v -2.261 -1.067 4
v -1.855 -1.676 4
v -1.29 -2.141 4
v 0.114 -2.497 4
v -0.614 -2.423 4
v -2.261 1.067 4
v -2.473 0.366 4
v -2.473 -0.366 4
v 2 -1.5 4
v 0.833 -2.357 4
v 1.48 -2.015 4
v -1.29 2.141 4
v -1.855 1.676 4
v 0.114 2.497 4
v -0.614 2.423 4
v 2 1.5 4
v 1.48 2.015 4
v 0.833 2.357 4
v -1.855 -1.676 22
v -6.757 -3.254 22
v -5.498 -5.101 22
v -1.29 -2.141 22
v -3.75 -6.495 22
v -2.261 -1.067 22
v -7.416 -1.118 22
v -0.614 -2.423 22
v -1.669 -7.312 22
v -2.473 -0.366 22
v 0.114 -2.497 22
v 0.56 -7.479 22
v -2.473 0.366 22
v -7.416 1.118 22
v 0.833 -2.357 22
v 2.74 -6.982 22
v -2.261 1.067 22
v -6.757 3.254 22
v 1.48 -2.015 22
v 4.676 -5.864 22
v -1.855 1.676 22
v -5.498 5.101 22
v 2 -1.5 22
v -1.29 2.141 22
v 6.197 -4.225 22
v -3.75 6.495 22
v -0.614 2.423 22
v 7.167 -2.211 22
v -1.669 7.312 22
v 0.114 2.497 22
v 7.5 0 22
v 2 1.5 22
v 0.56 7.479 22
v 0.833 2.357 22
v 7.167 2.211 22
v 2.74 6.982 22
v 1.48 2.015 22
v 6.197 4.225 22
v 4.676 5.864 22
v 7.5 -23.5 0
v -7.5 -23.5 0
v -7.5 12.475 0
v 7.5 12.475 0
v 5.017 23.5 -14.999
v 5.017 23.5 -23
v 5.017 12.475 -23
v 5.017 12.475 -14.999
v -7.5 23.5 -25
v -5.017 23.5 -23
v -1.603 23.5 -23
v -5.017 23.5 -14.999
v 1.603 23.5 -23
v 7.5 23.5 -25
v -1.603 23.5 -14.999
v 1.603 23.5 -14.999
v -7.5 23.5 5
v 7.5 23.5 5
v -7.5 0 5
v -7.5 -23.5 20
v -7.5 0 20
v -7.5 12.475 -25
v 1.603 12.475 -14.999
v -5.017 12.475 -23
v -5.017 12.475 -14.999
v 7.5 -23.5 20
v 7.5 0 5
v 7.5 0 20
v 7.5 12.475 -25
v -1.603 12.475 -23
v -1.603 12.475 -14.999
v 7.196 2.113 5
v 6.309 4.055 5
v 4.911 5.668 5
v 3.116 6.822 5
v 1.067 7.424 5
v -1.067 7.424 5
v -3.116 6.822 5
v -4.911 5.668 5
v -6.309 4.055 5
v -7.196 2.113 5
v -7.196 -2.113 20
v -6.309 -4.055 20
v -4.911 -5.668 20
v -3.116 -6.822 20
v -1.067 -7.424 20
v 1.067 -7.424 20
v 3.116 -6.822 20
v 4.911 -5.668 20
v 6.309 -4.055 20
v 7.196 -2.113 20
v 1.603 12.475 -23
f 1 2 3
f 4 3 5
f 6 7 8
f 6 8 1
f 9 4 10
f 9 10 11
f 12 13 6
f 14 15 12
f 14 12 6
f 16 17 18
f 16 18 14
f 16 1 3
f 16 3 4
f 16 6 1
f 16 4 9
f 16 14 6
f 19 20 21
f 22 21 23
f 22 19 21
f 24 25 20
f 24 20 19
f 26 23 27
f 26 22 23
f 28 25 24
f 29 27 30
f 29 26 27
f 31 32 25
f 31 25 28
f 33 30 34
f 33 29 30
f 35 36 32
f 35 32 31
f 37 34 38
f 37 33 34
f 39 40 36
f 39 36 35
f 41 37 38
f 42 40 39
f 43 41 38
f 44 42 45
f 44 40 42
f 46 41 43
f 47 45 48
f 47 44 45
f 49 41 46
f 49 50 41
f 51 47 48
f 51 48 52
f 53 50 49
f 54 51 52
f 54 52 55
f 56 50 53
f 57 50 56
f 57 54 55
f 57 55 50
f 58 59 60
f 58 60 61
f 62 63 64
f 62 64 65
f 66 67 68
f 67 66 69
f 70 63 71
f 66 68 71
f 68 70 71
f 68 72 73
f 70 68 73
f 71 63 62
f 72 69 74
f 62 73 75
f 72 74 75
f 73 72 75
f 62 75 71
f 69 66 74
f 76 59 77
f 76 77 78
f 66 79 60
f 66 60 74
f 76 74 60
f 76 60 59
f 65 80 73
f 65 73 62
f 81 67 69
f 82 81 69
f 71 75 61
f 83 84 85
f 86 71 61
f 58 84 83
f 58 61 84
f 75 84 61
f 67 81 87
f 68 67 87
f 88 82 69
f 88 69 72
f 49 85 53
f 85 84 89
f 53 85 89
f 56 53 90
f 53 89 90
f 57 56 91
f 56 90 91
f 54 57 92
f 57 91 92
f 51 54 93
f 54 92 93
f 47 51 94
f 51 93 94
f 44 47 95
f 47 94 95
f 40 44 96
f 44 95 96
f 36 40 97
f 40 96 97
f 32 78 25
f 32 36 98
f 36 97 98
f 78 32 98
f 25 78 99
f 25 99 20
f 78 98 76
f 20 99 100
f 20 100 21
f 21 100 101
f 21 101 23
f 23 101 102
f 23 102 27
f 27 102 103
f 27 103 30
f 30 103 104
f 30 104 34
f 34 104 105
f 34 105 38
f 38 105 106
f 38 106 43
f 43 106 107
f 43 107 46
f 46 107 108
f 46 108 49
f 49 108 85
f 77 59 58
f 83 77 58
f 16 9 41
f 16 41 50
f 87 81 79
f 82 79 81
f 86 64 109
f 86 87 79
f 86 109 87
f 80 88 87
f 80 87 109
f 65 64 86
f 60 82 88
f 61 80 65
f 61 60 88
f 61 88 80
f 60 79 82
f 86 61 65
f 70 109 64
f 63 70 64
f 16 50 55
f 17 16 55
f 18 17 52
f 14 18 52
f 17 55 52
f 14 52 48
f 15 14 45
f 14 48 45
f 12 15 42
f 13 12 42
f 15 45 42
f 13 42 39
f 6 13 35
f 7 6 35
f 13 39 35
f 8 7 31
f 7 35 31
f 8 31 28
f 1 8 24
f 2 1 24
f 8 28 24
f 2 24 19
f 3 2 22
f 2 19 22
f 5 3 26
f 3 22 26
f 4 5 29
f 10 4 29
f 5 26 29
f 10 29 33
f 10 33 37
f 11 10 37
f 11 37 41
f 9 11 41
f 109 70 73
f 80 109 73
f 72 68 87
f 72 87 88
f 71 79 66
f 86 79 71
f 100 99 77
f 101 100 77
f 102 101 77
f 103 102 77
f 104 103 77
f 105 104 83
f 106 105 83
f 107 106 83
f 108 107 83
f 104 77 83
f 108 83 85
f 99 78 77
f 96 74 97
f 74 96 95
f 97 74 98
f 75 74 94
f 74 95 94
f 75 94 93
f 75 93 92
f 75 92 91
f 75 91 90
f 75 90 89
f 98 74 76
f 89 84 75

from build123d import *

# Parameters (mm, degrees)
F0_R     = 7.5
F1_DEPTH = 22
F3_DEPTH = 18
F4_W     = 15
F4_H     = 11.0249955803
F5_DEPTH = 5
F6_DEPTH = 25
F7_DEPTH = 20
F8_W     = 3.414438339
F8_H     = 8.0012119859
F9_DEPTH = 11.0259955803


with BuildPart() as f1:
    # F0 (on Top) → F1 (new body)
    with BuildSketch(Plane.XY):
        Circle(F0_R)
    extrude(amount=F1_DEPTH)

    # F2 (on face) → F3 (cut)
    with BuildSketch(Plane.XY.offset(22)):
        with BuildLine():
            Line((2, -1.5), (2, 1.5))
            ThreePointArc((2, 1.5), (-2.5, 0), (2, -1.5))
        make_face()
    extrude(amount=-F3_DEPTH, mode=Mode.SUBTRACT)

    # F4 (on face) → F5 (join)
    with BuildSketch(Plane(origin=(0, 0, 0), x_dir=(1, 0, 0), z_dir=(0, 0, -1))):
        with BuildLine():
            ThreePointArc((7.5, 0), (0, -7.5), (-7.5, 0))
            Line((-7.5, 0), (-7.5, -12.4750044197))
            Line((-7.5, -12.4750044197), (7.5, -12.4750044197))
            Line((7.5, -12.4750044197), (7.5, 0))
        make_face()
        with Locations((0, -17.9875022098)):
            Rectangle(F4_W, F4_H)
    extrude(amount=-F5_DEPTH)

    # F4 (on face) → F6 (join)
    with BuildSketch(Plane(origin=(0, 0, 0), x_dir=(1, 0, 0), z_dir=(0, 0, -1))):
        with Locations((0, -17.9875022098)):
            Rectangle(F4_W, F4_H)
    extrude(amount=F6_DEPTH)

    # F4 (on face) → F7 (join)
    with BuildSketch(Plane(origin=(0, 0, 0), x_dir=(1, 0, 0), z_dir=(0, 0, -1))):
        with BuildLine():
            Line((-7.5, 12.4750044197), (-7.5, 0))
            ThreePointArc((-7.5, 0), (0, 7.5), (7.5, 0))
            Line((7.5, 0), (7.5, 12.4750044197))
            Line((7.5, 12.4750044197), (-7.5, 12.4750044197))
        make_face()
        with Locations((0, 17.9875022098)):
            Rectangle(F4_W, F4_H)
    extrude(amount=-F7_DEPTH)

    # F8 (on face) → F9 (cut, through all)
    with BuildSketch(Plane.XZ.offset(-12.4750044197)):
        with Locations((3.3099151915, -18.999394007)):
            Rectangle(F8_W, F8_H)
        with Locations((-3.3099151915, -18.999394007)):
            Rectangle(F8_W, F8_H)
    extrude(amount=-F9_DEPTH, mode=Mode.SUBTRACT)


solid = f1.part
